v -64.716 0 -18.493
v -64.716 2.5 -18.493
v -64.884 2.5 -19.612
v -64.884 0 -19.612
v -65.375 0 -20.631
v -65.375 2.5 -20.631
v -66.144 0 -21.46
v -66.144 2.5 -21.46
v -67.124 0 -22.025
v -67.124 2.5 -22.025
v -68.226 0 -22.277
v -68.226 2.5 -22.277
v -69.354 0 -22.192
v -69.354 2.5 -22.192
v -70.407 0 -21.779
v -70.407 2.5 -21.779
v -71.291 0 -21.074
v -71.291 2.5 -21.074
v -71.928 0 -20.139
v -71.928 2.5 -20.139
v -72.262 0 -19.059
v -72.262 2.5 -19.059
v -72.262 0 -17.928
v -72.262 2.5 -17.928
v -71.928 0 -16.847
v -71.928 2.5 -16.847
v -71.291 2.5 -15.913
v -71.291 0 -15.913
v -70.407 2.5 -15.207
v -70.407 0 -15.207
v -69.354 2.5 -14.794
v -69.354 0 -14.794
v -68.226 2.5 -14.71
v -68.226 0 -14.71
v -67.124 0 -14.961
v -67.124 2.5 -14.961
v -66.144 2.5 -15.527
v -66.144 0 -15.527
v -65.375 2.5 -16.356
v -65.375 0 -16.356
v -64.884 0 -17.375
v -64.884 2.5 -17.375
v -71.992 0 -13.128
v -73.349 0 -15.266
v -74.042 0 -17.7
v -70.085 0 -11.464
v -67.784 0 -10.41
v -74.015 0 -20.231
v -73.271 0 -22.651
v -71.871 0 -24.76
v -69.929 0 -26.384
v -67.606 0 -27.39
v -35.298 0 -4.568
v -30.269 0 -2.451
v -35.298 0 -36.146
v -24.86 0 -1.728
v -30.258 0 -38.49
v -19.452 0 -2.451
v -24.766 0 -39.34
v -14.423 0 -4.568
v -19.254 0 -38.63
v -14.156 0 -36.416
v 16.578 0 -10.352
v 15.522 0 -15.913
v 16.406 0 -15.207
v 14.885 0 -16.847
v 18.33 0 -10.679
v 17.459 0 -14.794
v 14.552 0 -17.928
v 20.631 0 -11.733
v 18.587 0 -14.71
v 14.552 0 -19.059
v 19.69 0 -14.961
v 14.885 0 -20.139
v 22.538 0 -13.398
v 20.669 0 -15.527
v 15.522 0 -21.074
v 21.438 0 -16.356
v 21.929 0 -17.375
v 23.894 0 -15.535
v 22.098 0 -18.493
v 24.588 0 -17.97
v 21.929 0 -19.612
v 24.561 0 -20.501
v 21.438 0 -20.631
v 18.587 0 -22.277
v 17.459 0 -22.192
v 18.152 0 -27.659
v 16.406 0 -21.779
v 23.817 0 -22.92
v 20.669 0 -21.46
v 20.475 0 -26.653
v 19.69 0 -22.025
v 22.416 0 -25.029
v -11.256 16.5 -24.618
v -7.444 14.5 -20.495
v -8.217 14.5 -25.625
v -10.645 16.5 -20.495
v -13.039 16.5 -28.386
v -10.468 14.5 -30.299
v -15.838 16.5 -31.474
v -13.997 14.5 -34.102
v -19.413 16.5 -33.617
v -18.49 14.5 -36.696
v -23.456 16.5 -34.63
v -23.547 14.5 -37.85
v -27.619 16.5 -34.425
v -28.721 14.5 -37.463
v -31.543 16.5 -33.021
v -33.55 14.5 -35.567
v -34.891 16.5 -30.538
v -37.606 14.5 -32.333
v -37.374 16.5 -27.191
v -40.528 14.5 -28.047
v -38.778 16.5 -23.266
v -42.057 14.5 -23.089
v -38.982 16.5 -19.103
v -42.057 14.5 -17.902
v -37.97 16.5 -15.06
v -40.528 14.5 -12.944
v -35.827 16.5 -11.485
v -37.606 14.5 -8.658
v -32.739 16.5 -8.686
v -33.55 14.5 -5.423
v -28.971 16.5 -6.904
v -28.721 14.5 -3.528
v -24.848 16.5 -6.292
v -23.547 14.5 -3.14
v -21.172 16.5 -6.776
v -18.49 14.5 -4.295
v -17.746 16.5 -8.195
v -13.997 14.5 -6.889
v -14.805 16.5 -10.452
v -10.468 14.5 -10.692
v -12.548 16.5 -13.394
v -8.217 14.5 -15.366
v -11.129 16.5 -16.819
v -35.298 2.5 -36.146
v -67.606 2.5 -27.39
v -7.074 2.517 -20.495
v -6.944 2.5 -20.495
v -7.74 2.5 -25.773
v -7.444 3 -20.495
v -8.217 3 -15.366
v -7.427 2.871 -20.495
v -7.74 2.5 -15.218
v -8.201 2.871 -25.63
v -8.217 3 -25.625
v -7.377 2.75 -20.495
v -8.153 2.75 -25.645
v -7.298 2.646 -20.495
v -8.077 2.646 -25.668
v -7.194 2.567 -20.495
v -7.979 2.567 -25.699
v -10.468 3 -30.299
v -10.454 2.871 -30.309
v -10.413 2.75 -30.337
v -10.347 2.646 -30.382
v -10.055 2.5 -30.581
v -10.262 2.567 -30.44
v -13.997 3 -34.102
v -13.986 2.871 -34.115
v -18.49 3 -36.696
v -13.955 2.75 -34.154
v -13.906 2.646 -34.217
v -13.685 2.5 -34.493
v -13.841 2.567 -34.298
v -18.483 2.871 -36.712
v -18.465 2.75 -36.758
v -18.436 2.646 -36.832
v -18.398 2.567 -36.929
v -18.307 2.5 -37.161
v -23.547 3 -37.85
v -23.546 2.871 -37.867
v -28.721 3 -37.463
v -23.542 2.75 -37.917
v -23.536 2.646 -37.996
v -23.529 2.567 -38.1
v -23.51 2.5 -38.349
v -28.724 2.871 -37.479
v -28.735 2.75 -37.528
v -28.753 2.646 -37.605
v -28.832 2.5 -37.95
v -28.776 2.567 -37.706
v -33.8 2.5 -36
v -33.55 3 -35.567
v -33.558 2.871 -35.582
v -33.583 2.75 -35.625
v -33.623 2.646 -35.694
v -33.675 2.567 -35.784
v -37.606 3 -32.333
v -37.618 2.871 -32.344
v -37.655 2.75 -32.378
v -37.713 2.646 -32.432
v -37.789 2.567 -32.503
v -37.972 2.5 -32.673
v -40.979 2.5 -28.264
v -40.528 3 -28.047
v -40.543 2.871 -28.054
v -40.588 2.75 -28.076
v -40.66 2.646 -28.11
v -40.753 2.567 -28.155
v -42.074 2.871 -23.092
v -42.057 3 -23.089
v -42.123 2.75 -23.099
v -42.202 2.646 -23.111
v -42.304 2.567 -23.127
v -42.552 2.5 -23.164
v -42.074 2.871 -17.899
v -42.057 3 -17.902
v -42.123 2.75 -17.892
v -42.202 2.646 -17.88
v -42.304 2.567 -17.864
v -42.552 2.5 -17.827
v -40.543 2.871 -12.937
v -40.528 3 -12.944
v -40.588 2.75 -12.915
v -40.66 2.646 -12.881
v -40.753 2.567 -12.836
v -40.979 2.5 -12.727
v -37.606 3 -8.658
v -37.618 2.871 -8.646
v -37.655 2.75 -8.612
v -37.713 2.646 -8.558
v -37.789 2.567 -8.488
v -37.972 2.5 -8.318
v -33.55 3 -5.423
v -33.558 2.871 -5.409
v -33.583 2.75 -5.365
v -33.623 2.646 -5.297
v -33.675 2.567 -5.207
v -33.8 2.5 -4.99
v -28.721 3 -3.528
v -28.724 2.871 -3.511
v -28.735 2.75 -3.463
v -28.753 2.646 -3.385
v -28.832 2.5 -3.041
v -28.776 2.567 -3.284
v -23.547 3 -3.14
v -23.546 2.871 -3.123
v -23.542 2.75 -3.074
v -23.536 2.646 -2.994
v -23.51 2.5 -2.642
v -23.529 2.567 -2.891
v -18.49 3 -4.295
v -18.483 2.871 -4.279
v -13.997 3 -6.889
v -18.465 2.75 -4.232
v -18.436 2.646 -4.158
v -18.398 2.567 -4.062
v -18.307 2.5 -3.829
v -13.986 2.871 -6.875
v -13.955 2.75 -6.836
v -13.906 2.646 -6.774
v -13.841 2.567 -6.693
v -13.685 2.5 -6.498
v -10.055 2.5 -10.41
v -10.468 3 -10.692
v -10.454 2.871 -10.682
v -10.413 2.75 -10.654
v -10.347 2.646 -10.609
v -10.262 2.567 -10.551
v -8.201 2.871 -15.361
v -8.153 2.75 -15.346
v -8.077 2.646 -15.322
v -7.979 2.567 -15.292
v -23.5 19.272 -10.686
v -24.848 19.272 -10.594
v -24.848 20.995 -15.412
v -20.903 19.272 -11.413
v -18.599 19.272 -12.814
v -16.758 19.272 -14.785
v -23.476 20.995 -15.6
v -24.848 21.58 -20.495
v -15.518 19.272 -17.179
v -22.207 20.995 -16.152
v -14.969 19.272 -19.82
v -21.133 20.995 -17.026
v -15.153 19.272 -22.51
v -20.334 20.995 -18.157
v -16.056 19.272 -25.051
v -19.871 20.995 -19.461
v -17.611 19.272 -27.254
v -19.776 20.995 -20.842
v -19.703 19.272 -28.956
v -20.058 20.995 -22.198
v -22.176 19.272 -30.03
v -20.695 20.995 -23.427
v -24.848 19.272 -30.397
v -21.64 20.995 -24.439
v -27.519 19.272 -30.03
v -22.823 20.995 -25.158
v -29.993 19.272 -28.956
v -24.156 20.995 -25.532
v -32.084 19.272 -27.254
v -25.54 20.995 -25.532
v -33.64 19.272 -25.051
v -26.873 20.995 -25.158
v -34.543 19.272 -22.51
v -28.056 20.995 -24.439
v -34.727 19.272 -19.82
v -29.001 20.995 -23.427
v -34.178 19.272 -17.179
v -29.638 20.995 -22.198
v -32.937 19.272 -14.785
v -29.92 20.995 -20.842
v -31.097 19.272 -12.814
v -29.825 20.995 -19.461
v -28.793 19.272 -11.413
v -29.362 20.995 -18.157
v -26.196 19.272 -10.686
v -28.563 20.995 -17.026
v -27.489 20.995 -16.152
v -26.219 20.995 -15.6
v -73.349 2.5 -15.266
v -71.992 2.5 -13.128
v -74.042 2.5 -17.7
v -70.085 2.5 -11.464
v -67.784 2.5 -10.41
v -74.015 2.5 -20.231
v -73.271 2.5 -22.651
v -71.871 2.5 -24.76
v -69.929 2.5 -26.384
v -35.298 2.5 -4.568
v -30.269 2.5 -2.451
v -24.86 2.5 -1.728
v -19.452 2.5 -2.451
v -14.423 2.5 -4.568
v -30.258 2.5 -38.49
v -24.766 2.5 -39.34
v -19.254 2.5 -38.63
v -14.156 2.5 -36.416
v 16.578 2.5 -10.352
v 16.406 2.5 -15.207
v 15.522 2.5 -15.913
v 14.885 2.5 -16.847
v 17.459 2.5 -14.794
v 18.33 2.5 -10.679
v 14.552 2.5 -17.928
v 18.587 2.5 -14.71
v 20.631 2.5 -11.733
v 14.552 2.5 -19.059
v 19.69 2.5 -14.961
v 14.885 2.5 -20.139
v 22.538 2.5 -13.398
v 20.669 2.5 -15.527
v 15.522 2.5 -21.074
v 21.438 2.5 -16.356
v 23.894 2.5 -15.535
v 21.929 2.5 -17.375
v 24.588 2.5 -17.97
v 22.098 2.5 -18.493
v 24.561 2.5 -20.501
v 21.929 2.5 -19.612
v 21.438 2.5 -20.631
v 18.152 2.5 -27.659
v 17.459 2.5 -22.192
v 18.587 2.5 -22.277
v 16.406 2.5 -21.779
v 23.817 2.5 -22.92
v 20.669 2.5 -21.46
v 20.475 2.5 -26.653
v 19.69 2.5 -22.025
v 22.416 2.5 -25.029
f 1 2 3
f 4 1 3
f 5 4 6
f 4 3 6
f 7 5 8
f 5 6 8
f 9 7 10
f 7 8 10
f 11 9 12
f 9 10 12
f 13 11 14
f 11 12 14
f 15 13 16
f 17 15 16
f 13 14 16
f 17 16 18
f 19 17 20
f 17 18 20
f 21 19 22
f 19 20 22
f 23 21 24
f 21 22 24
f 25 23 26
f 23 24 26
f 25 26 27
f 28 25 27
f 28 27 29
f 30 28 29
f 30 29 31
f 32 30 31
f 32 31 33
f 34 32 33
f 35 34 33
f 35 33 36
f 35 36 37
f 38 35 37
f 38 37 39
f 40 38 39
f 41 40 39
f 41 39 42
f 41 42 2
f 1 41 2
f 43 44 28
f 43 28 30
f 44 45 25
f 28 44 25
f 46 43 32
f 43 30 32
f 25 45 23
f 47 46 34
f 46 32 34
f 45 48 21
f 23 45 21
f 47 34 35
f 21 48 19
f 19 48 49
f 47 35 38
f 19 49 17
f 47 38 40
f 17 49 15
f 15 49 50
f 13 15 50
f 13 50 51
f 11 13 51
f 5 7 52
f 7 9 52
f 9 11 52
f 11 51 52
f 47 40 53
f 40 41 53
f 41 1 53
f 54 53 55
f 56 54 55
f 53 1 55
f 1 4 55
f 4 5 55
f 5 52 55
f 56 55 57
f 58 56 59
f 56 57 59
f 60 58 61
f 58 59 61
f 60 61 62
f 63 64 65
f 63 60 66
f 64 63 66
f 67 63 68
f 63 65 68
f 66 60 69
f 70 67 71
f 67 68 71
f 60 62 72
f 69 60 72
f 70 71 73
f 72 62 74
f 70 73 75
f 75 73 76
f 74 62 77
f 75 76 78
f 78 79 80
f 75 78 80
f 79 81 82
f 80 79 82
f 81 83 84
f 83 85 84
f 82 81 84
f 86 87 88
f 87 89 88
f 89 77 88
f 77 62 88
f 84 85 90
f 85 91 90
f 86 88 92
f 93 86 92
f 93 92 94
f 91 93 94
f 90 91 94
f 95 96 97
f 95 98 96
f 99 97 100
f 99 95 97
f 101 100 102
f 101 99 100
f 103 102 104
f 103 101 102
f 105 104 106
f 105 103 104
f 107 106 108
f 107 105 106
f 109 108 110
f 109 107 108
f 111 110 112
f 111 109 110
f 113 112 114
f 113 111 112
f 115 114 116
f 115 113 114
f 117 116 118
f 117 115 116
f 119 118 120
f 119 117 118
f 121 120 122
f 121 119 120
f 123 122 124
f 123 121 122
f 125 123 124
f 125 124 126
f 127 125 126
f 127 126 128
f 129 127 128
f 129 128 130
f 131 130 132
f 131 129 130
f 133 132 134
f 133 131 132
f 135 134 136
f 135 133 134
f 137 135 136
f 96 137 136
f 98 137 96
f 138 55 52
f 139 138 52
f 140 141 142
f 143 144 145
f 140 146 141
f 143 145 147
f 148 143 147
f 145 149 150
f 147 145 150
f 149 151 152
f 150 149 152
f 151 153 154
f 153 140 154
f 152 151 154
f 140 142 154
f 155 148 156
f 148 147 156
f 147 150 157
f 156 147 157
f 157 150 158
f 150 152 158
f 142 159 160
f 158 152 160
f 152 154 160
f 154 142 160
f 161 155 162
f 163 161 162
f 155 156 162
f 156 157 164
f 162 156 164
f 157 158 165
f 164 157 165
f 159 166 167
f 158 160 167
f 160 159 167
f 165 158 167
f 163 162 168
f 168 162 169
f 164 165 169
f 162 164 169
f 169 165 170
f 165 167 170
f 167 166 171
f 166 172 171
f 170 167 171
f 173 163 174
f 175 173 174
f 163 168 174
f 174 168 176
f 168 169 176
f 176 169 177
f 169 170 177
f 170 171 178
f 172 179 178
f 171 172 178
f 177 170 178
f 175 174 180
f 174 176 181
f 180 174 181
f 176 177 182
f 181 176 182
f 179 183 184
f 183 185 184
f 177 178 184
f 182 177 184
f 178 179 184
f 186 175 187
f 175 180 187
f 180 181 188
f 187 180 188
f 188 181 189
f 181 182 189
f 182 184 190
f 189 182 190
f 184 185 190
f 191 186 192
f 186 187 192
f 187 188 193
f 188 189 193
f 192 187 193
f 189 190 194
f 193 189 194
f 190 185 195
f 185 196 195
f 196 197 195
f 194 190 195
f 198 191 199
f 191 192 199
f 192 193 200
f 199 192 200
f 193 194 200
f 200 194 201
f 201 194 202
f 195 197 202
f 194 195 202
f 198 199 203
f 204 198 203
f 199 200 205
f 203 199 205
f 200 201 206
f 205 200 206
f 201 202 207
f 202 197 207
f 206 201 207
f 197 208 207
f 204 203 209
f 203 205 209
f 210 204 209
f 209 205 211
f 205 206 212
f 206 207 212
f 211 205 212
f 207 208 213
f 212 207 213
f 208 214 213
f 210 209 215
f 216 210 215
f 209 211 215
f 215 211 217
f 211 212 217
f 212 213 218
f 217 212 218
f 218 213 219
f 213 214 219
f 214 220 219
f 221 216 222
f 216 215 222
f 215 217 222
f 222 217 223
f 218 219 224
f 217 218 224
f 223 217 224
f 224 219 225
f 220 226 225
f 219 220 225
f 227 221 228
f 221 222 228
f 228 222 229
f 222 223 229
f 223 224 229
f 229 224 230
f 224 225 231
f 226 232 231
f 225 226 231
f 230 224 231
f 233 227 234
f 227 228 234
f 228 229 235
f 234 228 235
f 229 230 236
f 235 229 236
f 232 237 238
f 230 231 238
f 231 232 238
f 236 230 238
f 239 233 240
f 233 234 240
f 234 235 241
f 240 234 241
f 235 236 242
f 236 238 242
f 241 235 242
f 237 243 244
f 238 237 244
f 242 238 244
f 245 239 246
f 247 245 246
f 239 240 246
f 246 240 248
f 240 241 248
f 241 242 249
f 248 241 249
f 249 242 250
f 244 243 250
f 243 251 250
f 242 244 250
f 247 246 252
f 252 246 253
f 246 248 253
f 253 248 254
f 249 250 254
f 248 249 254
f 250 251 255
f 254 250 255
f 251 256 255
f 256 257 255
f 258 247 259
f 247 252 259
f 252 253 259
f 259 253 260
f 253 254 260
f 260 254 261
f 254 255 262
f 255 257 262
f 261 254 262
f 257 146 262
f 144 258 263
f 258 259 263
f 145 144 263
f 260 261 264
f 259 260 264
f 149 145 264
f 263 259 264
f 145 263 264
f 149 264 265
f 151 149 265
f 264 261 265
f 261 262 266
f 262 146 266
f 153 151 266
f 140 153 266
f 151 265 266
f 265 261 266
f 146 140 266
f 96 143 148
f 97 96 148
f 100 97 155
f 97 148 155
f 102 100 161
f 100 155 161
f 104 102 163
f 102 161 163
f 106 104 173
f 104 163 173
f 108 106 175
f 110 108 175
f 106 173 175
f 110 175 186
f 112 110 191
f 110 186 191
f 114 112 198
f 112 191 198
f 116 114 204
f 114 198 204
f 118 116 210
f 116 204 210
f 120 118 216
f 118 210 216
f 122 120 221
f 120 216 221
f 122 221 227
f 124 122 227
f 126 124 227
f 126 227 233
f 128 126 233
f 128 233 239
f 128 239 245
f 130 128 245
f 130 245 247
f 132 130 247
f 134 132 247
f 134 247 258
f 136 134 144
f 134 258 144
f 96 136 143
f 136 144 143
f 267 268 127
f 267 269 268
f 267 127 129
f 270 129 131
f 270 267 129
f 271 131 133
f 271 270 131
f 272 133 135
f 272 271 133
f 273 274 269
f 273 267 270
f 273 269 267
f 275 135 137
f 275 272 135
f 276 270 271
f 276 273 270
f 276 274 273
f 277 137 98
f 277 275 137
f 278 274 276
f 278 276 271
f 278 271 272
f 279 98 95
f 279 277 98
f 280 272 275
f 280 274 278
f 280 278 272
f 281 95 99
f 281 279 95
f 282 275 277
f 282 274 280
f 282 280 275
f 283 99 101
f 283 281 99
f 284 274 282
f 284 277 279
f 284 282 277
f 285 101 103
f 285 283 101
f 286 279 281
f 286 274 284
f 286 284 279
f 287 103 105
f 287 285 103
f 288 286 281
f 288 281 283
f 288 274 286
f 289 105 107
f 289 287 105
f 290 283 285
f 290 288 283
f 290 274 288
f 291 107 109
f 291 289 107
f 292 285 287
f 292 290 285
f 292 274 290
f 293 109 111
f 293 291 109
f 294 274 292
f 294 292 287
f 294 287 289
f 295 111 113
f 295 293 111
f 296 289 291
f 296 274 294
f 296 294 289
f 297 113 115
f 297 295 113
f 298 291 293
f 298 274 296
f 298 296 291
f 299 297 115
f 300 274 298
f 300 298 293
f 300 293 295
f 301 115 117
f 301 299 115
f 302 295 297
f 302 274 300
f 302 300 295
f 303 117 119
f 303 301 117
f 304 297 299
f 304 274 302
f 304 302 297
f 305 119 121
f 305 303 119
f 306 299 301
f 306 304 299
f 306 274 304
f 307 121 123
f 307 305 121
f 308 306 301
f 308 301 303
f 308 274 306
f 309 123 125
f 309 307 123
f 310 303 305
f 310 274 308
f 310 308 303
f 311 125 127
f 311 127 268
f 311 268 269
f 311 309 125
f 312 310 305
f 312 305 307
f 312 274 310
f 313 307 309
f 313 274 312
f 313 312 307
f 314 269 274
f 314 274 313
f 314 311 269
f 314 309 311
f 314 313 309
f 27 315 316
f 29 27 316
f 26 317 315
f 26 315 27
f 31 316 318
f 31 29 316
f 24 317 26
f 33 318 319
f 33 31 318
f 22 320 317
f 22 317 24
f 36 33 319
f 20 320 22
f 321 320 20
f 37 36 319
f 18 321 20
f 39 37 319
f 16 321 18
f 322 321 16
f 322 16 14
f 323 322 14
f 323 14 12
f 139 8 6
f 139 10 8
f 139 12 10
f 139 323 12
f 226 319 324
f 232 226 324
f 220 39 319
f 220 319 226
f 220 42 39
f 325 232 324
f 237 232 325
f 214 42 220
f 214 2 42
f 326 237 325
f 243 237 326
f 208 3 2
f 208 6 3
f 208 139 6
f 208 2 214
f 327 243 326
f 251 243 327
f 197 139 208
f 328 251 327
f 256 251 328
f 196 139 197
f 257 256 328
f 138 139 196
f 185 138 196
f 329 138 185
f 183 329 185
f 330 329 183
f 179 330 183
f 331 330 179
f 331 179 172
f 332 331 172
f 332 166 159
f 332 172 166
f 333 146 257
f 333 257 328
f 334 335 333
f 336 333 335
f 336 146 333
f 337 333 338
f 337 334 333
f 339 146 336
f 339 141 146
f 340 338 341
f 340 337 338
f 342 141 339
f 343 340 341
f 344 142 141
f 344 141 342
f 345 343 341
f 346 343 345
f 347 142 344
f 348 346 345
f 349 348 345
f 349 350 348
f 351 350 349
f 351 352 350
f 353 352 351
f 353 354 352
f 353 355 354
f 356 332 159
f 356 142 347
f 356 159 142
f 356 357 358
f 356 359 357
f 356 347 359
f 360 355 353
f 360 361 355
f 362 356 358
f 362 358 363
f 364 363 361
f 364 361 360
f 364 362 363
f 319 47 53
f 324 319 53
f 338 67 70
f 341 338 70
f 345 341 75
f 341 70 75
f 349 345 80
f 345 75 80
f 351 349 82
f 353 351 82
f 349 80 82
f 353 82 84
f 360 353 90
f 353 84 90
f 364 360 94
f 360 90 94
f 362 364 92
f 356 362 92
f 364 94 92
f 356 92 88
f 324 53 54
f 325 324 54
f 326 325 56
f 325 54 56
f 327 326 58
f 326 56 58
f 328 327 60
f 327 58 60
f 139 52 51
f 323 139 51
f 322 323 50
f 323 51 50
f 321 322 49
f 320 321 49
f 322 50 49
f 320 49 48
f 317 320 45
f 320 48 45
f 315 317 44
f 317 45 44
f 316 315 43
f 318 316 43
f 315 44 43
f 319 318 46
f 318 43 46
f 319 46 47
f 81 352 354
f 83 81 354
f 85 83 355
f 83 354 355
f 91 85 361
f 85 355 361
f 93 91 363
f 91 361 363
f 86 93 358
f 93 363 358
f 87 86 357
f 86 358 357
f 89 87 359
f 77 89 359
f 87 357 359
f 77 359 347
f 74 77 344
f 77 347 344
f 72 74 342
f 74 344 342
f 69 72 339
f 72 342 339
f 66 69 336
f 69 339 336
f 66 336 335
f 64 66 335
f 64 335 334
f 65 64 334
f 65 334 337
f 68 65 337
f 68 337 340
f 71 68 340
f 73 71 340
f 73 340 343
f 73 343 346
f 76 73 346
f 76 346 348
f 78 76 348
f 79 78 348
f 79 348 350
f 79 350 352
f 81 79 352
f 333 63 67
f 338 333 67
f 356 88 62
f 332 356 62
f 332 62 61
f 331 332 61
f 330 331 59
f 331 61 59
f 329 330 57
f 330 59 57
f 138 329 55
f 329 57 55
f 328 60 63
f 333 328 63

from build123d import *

# Parameters (mm, degrees)
BOSS_EXTRUDE2_DEPTH = 2.5
SKETCH3_R           = 17.40366437
BOSS_EXTRUDE3_DEPTH = 14
CHAMFER1_SIZE       = 2
CHAMFER1_SIZE2      = 3.200669058
DOME1_FACE_RADIUS   = 14.202995312
DOME1_HEIGHT        = 5.08
SKETCH4_R           = 3.794155
SKETCH4_R_2         = 3.79415255
CUT_EXTRUDE1_DEPTH  = 22.225
FILLET1_R           = 0.5


with BuildPart() as part:
    # Sketch2 → Boss-Extrude2 (new body)
    with BuildSketch(Plane(origin=(0, 0, 0), x_dir=(1, 0, 0), z_dir=(0, 1, 0))):
        with BuildLine():
            Line((-35.297990867, 36.146423133), (-67.605962497, 27.389534463))
            ThreePointArc((-67.605962497, 27.389534463), (-74.11985651, 18.96683835), (-67.783839922, 10.40953043))
            Line((-67.783839922, 10.40953043), (-35.297990867, 4.567846601))
            ThreePointArc((-35.297990867, 4.567846601), (-24.860460433, 1.727880743), (-14.422929998, 4.567846601))
            Line((-14.422929998, 4.567846601), (16.577836549, 10.352015281))
            Line((16.577836549, 10.352015281), (18.329761229, 10.678891968))
            ThreePointArc((18.329761229, 10.678891968), (24.665777818, 19.236199887), (18.151883804, 27.658896001))
            Line((18.151883804, 27.658896001), (-14.156087825, 36.415784671))
            ThreePointArc((-14.156087825, 36.415784671), (-24.766013326, 39.340130463), (-35.297990867, 36.146423133))
        make_face()
    extrude(amount=BOSS_EXTRUDE2_DEPTH)

    # Sketch3 → Boss-Extrude3 (add)
    with BuildSketch(Plane(origin=(0, 2.5, 0), x_dir=(1, 0, 0), z_dir=(0, 1, 0))):
        with Locations((-24.847892724, 20.495392169)):
            Circle(SKETCH3_R)
    extrude(amount=BOSS_EXTRUDE3_DEPTH)

    # Chamfer1
    chamfer1_edges = [part.edges().sort_by_distance(p)[0] for p in [
        (-42.251557093, 16.5, -20.495392169),
    ]]
    chamfer1_side = [part.faces().sort_by_distance(p)[0] for p in [
        (-42.251557093, 9.5, -20.495392169),
    ]]
    chamfer(chamfer1_edges, length=CHAMFER1_SIZE, length2=CHAMFER1_SIZE2, reference=chamfer1_side[0])

    # Dome1: a dome of height H over a round flat face of radius A is a cap of a sphere of radius (A * A + H * H) / (2 * H)
    dome1_r = (DOME1_FACE_RADIUS * DOME1_FACE_RADIUS + DOME1_HEIGHT * DOME1_HEIGHT) / (2 * DOME1_HEIGHT)
    dome1_base = Plane((-24.847892724, 16.5, -20.495392169), z_dir=(0, 1, 0))
    with Locations(dome1_base.offset(DOME1_HEIGHT - dome1_r)):
        dome1_ball = Sphere(dome1_r, mode=Mode.PRIVATE)
    add(split(dome1_ball, bisect_by=dome1_base, keep=Keep.TOP, mode=Mode.PRIVATE))

    # Sketch4 → Cut-Extrude1 (cut)
    with BuildSketch(Plane(origin=(0, 2.5, 0), x_dir=(1, 0, 0), z_dir=(0, 1, 0))):
        with Locations((18.303486059, 18.493262314)):
            Circle(SKETCH4_R)
        with Locations((-68.509987209, 18.493262314)):
            Circle(SKETCH4_R_2)
    extrude(amount=-CUT_EXTRUDE1_DEPTH, mode=Mode.SUBTRACT)

    # Fillet1
    fillet1_edges = [part.edges().sort_by_distance(p)[0] for p in [
        (-42.251557093, 2.5, -20.495392169),
    ]]
    fillet(fillet1_edges, radius=FILLET1_R)


solid = part.part
